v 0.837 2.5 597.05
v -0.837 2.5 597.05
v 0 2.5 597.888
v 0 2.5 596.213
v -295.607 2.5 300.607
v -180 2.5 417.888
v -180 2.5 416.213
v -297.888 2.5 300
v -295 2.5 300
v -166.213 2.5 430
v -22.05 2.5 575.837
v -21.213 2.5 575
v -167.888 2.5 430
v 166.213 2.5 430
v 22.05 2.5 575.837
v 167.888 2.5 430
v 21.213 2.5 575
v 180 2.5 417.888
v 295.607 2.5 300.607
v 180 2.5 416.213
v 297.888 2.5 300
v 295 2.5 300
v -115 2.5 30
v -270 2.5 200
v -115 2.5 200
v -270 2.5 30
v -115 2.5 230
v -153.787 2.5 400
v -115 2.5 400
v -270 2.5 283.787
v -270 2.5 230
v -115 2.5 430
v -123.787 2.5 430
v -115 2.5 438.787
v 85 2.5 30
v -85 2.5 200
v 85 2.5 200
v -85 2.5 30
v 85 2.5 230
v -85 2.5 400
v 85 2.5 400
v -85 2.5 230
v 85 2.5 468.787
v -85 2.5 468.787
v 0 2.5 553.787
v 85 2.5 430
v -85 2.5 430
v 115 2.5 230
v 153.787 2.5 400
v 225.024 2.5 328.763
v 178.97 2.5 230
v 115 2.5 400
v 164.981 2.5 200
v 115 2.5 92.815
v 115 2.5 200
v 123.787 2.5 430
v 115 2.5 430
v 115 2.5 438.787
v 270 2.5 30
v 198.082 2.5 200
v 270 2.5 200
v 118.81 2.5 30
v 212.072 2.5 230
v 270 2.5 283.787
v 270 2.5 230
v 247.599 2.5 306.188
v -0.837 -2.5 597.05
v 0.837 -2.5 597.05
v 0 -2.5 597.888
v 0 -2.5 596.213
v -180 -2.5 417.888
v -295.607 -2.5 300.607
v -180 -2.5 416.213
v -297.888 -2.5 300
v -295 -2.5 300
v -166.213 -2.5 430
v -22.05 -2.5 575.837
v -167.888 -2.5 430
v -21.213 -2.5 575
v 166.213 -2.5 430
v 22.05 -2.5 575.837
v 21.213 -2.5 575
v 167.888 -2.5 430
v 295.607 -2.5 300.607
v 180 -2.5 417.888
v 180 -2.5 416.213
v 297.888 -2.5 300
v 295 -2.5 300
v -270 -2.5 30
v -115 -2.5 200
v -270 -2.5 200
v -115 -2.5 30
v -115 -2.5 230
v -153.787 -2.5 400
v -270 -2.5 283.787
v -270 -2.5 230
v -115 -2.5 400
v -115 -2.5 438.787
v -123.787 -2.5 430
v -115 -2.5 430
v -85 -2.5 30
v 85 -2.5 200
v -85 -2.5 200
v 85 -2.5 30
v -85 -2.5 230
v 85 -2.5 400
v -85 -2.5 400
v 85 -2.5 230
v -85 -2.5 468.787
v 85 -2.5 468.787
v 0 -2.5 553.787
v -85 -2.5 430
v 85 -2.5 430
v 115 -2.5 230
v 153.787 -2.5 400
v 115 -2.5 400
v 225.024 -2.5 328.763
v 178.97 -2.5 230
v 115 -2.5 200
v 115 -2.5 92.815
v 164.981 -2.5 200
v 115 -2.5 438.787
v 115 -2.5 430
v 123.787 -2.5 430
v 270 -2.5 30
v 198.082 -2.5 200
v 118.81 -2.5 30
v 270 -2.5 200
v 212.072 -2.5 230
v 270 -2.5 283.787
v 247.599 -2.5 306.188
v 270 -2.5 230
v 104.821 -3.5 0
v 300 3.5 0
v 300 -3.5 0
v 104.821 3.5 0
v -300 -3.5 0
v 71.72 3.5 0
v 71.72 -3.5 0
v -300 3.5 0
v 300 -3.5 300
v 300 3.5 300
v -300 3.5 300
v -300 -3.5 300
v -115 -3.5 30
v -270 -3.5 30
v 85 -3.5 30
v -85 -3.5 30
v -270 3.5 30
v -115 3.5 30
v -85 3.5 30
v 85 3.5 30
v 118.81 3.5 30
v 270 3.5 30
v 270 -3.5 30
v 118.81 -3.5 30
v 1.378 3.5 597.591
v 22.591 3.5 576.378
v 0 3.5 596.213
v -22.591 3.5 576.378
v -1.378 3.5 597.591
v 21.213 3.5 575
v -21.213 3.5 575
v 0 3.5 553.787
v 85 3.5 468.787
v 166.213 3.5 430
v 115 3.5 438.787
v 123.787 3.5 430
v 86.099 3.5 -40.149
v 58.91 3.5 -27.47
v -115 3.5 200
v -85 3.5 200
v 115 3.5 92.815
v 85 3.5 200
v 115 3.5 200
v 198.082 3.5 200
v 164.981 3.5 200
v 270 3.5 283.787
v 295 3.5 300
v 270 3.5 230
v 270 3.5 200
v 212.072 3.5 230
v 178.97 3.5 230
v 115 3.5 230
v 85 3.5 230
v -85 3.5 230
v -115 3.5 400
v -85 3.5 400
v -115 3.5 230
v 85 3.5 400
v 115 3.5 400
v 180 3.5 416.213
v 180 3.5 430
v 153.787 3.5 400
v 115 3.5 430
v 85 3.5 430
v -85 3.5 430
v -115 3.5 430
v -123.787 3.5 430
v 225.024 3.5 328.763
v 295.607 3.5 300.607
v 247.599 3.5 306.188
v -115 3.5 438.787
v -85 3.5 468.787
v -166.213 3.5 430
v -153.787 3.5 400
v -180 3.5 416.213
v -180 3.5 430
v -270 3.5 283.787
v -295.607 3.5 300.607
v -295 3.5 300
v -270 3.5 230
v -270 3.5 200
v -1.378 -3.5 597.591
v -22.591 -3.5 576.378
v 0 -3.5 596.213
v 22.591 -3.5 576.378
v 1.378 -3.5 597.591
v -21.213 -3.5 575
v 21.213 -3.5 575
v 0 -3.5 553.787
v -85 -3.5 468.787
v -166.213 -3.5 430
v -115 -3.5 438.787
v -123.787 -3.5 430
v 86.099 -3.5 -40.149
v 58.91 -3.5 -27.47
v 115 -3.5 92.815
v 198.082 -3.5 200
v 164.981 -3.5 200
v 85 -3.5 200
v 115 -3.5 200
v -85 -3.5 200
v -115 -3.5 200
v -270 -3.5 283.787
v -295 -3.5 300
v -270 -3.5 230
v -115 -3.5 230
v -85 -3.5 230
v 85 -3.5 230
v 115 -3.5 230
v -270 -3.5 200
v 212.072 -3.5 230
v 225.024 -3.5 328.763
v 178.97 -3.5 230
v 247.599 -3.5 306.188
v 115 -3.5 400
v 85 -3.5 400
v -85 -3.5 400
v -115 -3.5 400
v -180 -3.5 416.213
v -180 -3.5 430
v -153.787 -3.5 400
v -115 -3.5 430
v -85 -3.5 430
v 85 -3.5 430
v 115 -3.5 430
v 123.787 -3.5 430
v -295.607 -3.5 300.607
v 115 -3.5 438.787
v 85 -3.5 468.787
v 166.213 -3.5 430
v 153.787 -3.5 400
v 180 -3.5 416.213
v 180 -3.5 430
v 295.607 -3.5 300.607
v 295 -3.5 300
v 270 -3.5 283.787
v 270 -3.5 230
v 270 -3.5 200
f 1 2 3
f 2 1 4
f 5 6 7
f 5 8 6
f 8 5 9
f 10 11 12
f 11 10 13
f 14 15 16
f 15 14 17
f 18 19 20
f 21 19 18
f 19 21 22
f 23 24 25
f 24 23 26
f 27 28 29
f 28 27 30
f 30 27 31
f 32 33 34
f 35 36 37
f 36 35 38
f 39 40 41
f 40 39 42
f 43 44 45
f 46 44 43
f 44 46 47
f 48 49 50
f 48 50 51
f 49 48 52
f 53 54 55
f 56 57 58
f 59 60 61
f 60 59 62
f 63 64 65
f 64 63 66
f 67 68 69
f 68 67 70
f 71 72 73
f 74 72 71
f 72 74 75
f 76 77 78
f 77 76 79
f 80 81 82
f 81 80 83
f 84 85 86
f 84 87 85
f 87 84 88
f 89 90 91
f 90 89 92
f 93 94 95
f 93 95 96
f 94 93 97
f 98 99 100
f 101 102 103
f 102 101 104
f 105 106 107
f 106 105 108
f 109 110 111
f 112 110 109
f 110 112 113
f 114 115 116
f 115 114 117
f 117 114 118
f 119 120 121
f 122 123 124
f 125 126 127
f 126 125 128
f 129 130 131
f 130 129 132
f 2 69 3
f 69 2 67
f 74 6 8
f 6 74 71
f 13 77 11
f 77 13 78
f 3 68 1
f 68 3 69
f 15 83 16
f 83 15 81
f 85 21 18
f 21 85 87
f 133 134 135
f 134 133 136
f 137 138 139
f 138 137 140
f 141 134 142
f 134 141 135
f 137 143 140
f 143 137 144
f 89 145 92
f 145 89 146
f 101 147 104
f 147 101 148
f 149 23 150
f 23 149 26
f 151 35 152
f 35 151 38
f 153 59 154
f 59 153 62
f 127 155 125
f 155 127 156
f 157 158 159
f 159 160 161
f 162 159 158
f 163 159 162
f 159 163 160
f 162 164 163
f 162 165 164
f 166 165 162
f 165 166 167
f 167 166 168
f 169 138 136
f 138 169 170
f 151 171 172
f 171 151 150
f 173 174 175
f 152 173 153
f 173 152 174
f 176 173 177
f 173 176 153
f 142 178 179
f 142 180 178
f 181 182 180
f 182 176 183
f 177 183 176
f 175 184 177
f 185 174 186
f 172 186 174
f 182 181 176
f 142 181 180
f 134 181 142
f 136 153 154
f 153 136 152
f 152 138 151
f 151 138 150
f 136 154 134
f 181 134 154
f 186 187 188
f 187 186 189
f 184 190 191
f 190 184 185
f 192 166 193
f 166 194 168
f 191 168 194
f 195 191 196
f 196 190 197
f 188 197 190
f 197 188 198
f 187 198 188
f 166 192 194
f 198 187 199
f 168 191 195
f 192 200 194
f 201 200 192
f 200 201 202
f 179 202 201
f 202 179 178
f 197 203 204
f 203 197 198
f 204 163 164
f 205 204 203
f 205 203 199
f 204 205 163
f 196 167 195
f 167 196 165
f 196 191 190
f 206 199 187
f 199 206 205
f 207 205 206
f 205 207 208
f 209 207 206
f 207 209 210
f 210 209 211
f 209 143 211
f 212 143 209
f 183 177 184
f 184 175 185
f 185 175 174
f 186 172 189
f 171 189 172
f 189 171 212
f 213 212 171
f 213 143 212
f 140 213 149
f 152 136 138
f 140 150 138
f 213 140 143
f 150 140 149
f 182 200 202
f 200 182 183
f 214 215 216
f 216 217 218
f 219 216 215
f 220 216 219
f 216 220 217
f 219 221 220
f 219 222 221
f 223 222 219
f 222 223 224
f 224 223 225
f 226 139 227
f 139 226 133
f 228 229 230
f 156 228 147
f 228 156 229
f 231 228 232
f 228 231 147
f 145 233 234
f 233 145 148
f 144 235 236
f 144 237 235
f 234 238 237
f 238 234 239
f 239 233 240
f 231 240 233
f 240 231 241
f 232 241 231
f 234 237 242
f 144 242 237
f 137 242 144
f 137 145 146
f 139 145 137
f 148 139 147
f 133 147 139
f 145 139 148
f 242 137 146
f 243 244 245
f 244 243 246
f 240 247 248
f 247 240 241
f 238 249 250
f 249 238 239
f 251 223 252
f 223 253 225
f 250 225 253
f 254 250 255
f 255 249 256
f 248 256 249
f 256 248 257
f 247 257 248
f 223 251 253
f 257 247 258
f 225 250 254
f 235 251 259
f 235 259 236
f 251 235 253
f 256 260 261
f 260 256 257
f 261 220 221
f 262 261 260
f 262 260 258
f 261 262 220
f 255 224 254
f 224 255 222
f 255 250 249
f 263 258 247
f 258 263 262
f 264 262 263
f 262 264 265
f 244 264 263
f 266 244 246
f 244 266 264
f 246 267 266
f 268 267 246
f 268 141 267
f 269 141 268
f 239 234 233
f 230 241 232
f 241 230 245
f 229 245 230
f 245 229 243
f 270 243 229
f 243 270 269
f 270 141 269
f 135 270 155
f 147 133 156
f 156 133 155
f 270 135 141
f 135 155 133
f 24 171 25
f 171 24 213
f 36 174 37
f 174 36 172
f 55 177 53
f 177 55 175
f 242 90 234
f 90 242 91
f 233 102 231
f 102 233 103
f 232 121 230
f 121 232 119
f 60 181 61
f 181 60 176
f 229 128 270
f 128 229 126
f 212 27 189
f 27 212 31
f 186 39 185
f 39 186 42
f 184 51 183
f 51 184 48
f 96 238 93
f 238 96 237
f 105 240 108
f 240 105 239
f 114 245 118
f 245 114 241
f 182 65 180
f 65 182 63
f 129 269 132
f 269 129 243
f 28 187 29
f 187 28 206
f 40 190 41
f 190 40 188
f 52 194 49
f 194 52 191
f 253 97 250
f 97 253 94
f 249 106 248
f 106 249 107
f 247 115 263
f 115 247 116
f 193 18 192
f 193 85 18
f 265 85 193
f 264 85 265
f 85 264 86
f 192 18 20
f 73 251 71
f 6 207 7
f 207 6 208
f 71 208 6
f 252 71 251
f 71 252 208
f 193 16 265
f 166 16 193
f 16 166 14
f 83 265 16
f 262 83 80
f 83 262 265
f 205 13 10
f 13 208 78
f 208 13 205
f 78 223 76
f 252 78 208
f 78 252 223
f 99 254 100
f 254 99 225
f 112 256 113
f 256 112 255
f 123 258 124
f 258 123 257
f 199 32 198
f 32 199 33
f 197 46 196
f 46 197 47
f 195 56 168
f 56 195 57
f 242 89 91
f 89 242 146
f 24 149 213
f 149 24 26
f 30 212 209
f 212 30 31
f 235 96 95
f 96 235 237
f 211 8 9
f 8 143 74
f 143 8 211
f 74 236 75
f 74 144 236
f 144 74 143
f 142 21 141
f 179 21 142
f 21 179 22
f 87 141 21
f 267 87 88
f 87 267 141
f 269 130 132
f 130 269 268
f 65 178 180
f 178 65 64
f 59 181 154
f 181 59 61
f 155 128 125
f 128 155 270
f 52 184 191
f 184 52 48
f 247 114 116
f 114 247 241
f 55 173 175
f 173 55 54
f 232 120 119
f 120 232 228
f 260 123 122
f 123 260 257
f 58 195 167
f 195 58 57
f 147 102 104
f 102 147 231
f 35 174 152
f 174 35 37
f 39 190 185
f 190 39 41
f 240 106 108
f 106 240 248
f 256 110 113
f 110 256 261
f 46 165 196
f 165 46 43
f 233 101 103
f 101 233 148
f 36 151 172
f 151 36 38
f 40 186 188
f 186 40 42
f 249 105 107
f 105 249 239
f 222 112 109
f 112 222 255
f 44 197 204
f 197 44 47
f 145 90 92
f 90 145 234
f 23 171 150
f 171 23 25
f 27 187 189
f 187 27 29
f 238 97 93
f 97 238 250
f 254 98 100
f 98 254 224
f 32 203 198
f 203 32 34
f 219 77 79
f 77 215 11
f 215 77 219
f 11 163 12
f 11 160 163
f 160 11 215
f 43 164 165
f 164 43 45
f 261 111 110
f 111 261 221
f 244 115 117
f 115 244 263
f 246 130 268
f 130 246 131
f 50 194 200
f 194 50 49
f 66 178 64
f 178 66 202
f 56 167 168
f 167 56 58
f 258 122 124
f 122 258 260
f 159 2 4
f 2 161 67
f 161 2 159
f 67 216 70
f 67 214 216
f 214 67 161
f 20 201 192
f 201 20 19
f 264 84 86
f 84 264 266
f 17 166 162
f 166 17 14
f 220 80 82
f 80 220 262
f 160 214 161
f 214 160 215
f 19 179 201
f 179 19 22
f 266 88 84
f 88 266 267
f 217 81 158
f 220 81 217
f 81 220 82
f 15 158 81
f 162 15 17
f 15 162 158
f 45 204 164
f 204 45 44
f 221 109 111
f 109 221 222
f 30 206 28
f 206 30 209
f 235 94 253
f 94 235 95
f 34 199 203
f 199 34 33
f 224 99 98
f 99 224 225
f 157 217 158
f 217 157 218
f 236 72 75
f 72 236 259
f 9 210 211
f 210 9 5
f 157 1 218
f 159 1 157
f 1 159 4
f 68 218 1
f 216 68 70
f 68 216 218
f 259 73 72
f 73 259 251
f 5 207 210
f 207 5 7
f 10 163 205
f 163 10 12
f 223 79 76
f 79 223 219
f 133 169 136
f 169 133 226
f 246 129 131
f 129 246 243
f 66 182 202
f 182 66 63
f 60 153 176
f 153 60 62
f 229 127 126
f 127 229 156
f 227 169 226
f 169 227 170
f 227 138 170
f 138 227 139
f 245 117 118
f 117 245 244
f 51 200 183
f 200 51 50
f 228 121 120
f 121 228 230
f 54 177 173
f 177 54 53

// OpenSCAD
// Wassermuehle

/* [Gesamtmasse] */
// Breite der Muehle
BB = 600;
// Laenge der Muehle
LL = 800;
// Hoehe der Muehle
HH = 600;
// Wandstaerke der Muehle
WW = 5;

/* [Fachwerk] */
// Breite des Fachwerkbalken
FB = 30;
// Abstand der Fachwerkbalken BA = BB/3
BA = 200;

/* [Anzeige der Elemente] */
// Vorne
Vorne = true;
// Fachwerk vorne
FachwerkVorne = true;


module VorneKontour() {
    difference(){
        cube([BB,WW,HH],center=true);
        rotate([0,-45,0]) translate([0,0,BB/1.175]) 
        cube([BB,WW+2,HH],center=true);
        rotate([0,45,0]) translate([0,0,BB/1.175]) 
        cube([BB,WW+2,HH],center=true);
    }
}

module FachwerkVorne() {
    
        // senkrechte Baken
        translate([-BB/2+FB/2,0,0])
        Balken(HH/2);
        translate([BB/2-FB/2,0,0])
        Balken(HH/2);
        translate([BB/2-BA,0,0])
        Balken(HH*0.8);
        translate([-BB/2+BA,0,0])
        Balken(HH*0.8);
    
        // waagrechte Balken
        rotate([0,90,0])
        union() {
            translate([-FB/2,0,-BB/2])
            Balken(BB);
            translate([-FB/2-BA,0,-BB/2])
            Balken(BB);
            translate([-FB/2-2*BA,0,-BB*0.3])
            Balken(BB*0.6);
       }    
       
        // Dachbalken
        translate([BB/2-FB/2,0,HH/2-FB/3])
        rotate([0,-45,0])
        Balken(BB*0.7);
            
        translate([-BB/2+FB/2,0,HH/2-FB/3])
        rotate([0,45,0])
        Balken(BB*0.7);
            
        // schraege Balken
        rotate([0,25,0])
        translate([80,0,0])
        Balken(BB*2/3);
        

}

module Balken(BH) {
    translate([0,0,BH/2])
    cube([30,WW+2,BH],center=true);
}

module Vorne() {
    
    difference() {
        translate([0,0,HH/2])
        VorneKontour();
        FachwerkVorne();
    }
}

if (Vorne) color("White") Vorne();

if (FachwerkVorne)
    color("Brown")
    FachwerkVorne();
